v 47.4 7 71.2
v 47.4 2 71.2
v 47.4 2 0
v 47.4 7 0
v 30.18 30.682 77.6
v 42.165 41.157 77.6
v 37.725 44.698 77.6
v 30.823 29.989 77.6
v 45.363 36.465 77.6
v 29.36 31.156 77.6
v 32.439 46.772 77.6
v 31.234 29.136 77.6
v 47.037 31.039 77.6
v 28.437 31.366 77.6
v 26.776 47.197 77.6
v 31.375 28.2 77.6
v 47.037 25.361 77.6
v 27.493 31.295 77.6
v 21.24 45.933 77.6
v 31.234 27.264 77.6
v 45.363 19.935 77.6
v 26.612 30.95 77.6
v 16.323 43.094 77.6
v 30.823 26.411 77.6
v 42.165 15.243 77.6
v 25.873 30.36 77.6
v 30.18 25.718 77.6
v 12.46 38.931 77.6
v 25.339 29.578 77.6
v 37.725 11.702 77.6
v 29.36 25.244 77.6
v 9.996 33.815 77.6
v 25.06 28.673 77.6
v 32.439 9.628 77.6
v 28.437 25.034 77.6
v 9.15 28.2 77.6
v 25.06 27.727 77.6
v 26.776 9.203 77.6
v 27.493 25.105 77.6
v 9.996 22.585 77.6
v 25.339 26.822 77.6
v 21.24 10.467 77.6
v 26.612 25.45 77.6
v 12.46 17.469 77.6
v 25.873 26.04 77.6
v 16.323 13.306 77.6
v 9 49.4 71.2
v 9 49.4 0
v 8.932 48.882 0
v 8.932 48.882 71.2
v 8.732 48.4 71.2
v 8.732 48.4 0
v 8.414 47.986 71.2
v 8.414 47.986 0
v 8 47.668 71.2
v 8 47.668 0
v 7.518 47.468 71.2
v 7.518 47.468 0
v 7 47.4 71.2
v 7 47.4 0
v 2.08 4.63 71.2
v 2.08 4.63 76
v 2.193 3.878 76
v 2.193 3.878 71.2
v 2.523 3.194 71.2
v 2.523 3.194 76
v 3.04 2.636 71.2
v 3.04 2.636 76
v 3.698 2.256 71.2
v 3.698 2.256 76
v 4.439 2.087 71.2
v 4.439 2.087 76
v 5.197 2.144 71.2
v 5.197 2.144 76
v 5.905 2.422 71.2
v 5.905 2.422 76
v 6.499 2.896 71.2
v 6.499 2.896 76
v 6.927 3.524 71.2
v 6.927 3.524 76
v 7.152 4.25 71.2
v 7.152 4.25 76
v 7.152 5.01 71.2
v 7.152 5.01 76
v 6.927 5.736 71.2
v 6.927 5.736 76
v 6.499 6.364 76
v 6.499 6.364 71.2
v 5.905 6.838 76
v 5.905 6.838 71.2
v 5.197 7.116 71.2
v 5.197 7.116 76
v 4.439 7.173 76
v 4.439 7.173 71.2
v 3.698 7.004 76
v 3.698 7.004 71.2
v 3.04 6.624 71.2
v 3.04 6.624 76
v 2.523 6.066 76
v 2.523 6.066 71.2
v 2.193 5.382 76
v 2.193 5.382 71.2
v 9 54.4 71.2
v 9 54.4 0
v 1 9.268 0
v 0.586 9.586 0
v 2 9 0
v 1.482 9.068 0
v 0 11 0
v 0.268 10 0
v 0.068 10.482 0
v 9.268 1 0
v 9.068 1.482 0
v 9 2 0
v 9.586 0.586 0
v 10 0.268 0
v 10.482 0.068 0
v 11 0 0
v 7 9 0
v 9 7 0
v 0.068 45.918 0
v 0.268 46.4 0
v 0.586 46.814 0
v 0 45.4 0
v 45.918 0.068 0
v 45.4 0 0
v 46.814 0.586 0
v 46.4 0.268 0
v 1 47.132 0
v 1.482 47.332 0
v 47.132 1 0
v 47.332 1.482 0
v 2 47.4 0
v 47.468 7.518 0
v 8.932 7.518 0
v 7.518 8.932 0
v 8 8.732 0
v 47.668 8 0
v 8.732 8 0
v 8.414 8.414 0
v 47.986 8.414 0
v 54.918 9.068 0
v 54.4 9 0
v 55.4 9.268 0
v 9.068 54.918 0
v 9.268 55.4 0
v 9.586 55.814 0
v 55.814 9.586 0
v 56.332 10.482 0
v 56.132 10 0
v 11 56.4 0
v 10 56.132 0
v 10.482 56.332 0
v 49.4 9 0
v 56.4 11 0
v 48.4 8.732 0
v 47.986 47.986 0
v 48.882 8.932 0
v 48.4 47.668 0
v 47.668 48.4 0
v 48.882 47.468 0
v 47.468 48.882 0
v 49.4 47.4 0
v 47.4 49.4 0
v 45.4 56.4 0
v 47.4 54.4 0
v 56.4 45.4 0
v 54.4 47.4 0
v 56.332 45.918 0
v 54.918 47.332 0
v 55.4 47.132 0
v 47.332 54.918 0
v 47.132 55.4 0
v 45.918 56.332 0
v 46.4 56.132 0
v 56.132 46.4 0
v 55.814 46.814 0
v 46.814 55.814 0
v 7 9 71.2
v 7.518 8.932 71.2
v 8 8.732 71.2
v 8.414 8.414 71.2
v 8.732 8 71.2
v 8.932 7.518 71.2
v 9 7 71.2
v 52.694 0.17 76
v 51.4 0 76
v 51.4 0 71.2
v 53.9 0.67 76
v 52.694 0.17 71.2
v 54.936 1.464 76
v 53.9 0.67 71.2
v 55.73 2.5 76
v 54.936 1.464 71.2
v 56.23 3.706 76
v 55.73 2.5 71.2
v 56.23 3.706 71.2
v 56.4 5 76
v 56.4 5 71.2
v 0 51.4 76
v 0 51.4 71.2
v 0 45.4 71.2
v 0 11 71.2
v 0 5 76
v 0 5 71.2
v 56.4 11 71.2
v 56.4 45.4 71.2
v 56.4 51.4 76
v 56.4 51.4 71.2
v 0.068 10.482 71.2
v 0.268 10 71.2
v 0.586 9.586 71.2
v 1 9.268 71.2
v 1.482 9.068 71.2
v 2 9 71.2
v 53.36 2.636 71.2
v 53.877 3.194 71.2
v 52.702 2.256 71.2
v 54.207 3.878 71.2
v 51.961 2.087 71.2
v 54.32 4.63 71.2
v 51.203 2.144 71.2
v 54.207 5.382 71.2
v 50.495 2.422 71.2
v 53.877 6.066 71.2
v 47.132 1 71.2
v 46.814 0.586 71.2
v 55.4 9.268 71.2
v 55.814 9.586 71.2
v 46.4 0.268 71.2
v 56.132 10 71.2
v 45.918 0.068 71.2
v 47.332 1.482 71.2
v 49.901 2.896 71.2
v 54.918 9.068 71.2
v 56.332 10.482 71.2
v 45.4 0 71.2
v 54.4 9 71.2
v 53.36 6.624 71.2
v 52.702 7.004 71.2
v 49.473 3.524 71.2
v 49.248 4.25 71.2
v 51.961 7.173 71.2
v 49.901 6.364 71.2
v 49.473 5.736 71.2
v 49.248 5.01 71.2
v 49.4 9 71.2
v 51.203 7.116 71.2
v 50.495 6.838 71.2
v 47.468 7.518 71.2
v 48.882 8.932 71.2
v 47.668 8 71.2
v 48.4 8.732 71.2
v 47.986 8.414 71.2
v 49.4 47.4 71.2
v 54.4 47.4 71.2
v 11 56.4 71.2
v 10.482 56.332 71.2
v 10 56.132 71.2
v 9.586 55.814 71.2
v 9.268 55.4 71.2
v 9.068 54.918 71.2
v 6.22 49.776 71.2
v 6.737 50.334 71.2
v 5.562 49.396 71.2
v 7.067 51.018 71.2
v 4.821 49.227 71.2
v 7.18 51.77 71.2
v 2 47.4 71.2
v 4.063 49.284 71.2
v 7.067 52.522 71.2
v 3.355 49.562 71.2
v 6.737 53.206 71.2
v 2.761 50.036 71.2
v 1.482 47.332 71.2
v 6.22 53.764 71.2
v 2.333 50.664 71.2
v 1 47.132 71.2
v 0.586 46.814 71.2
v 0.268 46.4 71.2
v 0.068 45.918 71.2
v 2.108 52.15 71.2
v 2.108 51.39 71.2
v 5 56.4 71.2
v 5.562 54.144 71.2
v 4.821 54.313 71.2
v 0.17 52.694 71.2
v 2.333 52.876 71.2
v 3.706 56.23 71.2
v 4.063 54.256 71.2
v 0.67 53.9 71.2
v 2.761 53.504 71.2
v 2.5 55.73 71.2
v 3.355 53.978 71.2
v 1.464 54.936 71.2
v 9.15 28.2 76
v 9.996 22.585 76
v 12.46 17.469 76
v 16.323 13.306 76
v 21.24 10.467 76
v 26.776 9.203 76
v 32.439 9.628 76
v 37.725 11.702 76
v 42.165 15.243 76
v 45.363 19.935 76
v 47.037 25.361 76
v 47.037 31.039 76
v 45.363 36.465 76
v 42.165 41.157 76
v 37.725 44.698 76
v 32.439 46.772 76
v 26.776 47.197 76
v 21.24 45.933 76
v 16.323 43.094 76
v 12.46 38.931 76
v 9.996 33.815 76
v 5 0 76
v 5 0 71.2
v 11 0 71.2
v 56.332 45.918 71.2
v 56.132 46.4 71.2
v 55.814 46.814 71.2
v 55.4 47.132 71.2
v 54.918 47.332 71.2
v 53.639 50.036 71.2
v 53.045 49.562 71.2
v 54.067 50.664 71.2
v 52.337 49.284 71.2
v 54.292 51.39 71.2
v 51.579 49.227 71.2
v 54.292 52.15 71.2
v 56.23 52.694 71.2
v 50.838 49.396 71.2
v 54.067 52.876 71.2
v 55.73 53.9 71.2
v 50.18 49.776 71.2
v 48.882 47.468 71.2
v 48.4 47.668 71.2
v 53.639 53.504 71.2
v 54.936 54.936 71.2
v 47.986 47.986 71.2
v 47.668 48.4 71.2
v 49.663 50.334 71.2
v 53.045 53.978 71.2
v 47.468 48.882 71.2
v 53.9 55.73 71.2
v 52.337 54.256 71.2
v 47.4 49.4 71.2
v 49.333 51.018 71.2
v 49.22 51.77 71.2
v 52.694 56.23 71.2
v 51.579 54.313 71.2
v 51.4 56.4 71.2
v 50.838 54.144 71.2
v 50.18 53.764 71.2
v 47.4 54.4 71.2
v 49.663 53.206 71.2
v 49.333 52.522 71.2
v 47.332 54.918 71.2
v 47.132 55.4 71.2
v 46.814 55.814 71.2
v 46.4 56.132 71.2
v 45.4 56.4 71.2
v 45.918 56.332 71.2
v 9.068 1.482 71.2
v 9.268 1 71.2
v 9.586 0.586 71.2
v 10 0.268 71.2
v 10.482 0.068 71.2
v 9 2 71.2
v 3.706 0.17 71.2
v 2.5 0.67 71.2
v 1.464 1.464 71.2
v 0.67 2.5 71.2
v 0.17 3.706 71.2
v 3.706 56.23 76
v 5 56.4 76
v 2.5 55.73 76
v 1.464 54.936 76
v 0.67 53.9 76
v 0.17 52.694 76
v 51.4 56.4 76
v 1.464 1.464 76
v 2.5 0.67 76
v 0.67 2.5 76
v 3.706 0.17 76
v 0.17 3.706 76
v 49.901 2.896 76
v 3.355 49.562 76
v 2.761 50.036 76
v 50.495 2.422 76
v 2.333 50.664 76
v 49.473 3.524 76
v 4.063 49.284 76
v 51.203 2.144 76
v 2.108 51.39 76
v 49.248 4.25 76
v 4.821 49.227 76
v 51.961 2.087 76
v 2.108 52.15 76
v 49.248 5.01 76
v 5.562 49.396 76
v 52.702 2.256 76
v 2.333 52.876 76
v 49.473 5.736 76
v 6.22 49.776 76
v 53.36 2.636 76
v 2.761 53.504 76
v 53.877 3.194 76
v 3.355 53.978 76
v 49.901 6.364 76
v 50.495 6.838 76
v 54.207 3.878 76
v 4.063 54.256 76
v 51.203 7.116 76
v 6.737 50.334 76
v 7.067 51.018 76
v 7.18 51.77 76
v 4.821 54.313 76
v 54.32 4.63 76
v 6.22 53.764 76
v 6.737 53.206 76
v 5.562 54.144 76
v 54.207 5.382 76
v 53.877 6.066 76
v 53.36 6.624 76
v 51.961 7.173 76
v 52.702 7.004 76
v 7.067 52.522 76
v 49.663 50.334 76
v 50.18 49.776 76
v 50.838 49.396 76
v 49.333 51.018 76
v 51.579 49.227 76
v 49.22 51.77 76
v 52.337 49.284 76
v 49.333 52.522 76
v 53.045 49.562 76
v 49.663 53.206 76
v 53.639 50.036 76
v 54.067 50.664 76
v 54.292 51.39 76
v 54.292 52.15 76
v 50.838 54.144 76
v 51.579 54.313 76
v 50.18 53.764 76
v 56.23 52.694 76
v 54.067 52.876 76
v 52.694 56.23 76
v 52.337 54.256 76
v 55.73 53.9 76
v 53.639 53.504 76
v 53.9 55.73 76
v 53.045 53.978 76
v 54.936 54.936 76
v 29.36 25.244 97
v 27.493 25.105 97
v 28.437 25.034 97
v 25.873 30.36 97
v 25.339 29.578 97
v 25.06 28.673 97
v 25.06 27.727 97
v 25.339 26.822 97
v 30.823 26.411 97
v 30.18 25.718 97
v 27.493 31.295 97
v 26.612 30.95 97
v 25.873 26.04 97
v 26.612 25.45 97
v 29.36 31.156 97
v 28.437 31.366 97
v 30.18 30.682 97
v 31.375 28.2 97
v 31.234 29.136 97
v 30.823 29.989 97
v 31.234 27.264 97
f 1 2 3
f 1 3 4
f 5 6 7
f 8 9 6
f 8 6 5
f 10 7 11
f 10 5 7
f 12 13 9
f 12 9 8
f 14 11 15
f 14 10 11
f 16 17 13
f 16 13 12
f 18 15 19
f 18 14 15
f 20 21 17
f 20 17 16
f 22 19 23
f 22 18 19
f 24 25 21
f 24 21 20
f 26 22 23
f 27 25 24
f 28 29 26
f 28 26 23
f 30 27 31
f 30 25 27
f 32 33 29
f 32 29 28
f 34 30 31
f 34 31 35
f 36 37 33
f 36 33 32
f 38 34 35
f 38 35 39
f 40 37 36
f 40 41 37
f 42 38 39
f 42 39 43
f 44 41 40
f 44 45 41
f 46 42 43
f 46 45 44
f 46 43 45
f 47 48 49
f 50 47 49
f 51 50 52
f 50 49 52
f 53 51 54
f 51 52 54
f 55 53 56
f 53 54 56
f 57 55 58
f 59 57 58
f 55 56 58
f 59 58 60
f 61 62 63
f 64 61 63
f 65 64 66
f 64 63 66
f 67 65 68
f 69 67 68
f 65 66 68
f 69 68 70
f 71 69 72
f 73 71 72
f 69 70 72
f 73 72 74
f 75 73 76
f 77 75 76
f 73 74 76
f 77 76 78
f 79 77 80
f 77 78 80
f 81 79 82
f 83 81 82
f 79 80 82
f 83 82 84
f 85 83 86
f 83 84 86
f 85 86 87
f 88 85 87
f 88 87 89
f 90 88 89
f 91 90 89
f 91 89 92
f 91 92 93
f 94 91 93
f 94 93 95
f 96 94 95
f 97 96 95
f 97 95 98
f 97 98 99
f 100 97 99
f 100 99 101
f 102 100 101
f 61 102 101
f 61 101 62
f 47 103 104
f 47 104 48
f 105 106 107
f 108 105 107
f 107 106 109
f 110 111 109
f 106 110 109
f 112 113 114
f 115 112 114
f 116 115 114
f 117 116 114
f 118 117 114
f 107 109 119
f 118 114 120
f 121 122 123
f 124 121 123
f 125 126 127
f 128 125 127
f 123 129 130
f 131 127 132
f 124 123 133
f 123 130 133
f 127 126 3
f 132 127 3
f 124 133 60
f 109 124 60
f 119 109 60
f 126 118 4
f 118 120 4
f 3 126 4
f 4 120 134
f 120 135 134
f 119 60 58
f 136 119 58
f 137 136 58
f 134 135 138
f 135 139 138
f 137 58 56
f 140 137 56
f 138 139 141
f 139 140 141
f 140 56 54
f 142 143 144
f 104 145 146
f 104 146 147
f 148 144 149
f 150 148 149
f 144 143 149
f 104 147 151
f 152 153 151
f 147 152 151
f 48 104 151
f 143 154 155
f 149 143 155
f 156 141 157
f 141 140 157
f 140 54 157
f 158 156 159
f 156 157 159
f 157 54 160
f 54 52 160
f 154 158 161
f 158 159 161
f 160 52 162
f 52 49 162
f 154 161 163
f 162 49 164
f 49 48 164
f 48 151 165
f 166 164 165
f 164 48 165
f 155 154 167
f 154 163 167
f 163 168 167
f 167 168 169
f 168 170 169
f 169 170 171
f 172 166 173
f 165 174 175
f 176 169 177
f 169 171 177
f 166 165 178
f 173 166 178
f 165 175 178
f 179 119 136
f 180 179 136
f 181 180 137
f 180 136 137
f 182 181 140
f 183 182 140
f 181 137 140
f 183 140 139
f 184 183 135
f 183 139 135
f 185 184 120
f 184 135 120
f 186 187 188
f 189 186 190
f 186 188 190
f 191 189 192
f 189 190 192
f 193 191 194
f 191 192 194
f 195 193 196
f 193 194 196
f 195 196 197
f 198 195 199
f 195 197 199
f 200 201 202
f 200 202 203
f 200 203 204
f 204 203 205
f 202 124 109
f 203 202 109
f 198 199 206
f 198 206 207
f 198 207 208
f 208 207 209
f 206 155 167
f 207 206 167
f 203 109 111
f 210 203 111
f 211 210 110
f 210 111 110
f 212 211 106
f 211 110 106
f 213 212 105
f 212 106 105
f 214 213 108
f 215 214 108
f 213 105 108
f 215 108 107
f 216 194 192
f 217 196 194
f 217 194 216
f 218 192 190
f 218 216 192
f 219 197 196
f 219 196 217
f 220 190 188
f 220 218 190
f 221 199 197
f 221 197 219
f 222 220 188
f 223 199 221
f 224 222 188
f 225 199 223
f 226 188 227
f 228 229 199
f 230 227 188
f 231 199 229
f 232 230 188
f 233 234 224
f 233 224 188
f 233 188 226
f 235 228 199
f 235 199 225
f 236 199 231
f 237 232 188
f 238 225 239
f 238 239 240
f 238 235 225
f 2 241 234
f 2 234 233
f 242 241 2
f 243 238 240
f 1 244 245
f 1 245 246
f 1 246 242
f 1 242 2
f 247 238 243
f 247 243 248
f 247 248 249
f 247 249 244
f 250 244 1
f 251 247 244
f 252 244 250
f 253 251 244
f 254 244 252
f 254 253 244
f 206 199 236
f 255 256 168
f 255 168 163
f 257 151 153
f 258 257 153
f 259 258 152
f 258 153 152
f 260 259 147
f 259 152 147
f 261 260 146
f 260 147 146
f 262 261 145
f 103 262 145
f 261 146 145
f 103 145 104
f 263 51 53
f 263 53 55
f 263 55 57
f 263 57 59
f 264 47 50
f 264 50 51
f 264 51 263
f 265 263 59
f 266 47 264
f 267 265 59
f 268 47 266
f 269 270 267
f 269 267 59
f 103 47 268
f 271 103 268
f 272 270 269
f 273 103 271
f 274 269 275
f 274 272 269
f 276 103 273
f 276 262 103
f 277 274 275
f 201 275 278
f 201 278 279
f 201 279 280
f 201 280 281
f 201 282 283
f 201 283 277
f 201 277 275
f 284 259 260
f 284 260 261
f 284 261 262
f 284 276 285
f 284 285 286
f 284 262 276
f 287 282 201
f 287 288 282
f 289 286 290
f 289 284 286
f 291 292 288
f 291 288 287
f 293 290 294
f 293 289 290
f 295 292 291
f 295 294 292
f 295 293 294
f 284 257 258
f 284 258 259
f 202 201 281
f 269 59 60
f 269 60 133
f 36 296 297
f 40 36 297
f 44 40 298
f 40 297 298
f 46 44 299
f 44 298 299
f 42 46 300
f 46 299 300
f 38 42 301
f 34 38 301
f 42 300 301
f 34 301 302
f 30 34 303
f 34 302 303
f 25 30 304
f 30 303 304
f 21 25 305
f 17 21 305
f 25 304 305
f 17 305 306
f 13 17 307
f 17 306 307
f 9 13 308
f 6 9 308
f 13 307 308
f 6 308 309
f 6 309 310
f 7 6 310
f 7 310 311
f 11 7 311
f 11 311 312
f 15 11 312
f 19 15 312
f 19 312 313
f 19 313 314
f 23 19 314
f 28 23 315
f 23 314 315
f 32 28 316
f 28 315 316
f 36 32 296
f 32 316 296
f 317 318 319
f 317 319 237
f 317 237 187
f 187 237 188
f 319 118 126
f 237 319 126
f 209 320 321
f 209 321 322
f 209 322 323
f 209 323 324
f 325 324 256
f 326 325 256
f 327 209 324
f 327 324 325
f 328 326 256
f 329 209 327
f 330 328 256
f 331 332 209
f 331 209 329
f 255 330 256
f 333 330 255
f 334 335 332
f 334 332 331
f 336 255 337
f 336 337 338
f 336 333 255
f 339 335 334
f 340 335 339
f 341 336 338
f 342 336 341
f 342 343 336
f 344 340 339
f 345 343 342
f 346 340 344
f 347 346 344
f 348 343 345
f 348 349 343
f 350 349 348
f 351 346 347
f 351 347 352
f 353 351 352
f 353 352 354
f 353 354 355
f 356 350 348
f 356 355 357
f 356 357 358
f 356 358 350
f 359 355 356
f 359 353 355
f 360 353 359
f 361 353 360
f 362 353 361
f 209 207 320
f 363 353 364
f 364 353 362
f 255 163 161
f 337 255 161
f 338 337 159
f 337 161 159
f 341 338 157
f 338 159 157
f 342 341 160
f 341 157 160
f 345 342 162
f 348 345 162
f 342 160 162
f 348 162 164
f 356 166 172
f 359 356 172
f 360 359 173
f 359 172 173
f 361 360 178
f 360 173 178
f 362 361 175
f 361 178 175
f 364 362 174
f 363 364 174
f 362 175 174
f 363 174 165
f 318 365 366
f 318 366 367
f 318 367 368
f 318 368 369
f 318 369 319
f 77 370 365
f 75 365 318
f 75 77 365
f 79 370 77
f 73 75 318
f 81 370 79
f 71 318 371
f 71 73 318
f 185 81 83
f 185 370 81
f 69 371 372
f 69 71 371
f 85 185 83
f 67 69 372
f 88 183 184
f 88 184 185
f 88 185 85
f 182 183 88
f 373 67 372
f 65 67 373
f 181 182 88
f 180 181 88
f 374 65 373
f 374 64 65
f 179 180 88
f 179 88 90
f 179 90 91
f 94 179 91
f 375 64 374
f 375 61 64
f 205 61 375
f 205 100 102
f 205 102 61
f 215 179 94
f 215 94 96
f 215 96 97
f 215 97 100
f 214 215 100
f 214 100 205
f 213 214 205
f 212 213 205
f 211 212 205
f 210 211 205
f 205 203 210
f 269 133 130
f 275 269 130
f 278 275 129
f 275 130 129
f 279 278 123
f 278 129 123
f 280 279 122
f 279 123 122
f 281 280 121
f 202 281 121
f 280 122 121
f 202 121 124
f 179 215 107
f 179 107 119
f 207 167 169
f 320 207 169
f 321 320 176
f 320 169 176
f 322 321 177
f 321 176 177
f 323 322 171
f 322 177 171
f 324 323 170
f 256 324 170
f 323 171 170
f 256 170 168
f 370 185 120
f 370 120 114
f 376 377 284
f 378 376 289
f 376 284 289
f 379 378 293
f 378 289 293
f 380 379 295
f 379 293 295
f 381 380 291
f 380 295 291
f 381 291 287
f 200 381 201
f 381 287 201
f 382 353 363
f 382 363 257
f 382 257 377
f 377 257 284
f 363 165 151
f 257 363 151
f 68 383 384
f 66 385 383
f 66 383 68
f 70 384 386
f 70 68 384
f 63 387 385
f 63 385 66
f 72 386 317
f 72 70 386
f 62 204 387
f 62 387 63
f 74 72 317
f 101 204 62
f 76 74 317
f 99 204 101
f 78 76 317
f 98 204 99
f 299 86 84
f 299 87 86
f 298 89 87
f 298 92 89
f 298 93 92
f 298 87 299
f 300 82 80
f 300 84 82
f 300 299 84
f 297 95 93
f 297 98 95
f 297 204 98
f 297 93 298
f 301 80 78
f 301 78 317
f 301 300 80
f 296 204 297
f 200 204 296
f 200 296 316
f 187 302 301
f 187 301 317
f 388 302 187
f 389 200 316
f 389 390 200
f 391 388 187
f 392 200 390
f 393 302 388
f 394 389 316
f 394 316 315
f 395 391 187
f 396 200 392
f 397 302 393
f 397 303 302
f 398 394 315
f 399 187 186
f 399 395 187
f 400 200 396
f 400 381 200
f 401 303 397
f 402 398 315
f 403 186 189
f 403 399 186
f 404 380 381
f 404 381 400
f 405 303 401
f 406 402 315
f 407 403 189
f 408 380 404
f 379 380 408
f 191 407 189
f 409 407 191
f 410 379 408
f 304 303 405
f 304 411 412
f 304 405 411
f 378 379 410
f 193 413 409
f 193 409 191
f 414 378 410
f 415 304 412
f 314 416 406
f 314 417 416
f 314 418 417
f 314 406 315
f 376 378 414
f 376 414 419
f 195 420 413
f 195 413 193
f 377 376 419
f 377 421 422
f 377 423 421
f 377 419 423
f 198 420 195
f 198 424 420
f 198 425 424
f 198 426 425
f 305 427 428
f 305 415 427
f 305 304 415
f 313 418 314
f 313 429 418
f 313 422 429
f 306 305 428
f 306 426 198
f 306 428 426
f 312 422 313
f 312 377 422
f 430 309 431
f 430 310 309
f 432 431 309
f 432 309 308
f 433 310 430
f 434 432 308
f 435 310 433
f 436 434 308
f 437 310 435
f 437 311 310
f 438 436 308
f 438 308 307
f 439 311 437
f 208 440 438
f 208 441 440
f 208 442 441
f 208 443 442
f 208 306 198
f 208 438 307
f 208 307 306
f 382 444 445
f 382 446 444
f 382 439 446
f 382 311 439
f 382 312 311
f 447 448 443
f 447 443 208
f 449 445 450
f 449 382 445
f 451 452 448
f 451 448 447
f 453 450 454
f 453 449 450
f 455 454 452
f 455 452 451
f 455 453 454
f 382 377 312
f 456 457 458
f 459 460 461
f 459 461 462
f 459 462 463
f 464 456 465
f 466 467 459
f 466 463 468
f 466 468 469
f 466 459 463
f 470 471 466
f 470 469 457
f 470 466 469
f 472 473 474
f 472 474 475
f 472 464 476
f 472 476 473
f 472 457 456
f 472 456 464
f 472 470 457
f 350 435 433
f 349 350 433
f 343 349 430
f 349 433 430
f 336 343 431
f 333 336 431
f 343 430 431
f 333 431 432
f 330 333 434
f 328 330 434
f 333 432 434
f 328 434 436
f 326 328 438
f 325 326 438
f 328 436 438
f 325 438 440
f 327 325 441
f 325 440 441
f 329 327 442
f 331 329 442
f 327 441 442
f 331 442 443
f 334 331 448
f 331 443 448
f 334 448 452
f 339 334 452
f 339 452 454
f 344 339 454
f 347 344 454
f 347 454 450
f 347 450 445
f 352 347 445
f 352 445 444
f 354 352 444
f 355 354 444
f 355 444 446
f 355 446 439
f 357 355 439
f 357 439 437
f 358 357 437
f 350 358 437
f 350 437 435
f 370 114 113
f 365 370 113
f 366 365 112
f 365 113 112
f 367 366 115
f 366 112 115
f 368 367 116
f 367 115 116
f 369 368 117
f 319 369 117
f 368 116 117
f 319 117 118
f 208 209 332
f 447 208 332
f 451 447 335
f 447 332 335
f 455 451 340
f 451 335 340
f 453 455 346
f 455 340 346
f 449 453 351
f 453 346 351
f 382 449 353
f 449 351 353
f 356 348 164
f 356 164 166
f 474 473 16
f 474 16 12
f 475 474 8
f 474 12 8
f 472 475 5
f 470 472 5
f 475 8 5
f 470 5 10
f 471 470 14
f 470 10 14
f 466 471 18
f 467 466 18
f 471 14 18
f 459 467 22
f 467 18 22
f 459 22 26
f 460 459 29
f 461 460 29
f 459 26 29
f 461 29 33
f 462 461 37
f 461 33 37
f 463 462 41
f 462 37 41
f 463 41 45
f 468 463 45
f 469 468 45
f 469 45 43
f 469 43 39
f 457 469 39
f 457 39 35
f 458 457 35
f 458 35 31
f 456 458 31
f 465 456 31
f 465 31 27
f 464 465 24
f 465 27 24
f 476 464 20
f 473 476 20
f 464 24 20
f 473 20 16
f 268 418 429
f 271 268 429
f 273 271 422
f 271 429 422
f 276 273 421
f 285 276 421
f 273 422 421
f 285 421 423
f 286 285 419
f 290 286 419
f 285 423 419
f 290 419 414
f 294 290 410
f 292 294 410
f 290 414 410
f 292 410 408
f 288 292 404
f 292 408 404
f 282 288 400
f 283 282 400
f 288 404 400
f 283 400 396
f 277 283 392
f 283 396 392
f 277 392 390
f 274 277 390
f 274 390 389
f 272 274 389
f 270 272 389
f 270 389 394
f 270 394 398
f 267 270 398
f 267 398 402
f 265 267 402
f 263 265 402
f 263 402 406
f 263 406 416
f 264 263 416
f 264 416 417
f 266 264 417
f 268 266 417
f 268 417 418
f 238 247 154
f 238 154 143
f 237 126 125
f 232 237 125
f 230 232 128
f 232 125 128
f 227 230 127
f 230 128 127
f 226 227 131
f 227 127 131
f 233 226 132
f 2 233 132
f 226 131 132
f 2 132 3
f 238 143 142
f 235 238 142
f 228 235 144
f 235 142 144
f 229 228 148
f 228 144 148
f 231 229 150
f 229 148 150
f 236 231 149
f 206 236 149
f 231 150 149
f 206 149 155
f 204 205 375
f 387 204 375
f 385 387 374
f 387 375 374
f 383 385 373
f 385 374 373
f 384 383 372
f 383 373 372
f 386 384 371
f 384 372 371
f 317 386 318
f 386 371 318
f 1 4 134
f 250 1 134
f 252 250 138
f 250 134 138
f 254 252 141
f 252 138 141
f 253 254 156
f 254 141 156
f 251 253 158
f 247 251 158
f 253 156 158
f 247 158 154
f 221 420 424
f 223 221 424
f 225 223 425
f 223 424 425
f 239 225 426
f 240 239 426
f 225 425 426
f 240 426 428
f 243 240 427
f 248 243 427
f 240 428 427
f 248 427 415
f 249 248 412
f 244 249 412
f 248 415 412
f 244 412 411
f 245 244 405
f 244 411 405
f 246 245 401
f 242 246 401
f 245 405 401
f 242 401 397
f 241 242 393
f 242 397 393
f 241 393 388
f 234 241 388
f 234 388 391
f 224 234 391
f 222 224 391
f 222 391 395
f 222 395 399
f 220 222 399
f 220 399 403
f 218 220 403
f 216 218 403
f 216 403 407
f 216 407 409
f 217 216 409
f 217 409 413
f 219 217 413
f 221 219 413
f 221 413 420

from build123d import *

# Parameters (mm, degrees)
EXTRUDE_1_DEPTH     = 76
SKETCH_2_R          = 19.05
EXTRUDE_2_DEPTH     = 1.6
SKETCH_3_OUTSIDE_W  = 80.656
SKETCH_3_OUTSIDE_H  = 80.656
CUT_EXTRUDE_1_DEPTH = 71.2
SKETCH_4_R          = 2.55
CUT_EXTRUDE_2_DEPTH = 71.2
SKETCH_5_R          = 3.175
EXTRUDE_3_DEPTH     = 19.4


with BuildPart() as part:
    # Эскиз1 → Бобышка-Вытянуть1 (new body)
    with BuildSketch(Plane.XY):
        with BuildLine():
            Line((5, 0), (51.4, 0))
            ThreePointArc((51.4, 0), (54.935533906, 1.464466094), (56.4, 5))
            Line((56.4, 5), (56.4, 51.4))
            ThreePointArc((56.4, 51.4), (54.935533906, 54.935533906), (51.4, 56.4))
            Line((51.4, 56.4), (5, 56.4))
            ThreePointArc((5, 56.4), (1.464466094, 54.935533906), (0, 51.4))
            Line((0, 51.4), (0, 5))
            ThreePointArc((0, 5), (1.464466094, 1.464466094), (5, 0))
        make_face()
    extrude(amount=EXTRUDE_1_DEPTH)

    # Эскиз2 → Бобышка-Вытянуть2 (add)
    with BuildSketch(Plane.XY.offset(76)):
        with Locations(Location((28.2, 28.2, 0), (0, 0, 180))):
            Circle(SKETCH_2_R)
    extrude(amount=EXTRUDE_2_DEPTH)

    # Эскиз3 outside → Вырез-Вытянуть1 (cut)
    with BuildSketch(Plane(origin=(0, 0, 0), x_dir=(-1, 0, 0), z_dir=(0, 0, -1))):
        with Locations((-28.2, 28.2)):
            Rectangle(SKETCH_3_OUTSIDE_W, SKETCH_3_OUTSIDE_H)
        with BuildLine():
            Line((-56.4, 11), (-56.4, 45.4))
            ThreePointArc((-56.4, 45.4), (-55.814213562, 46.814213562), (-54.4, 47.4))
            Line((-54.4, 47.4), (-49.4, 47.4))
            ThreePointArc((-49.4, 47.4), (-47.985786438, 47.985786438), (-47.4, 49.4))
            Line((-47.4, 49.4), (-47.4, 54.4))
            ThreePointArc((-47.4, 54.4), (-46.814213562, 55.814213562), (-45.4, 56.4))
            Line((-45.4, 56.4), (-11, 56.4))
            ThreePointArc((-11, 56.4), (-9.585786438, 55.814213562), (-9, 54.4))
            Line((-9, 54.4), (-9, 49.4))
            ThreePointArc((-9, 49.4), (-8.414213562, 47.985786438), (-7, 47.4))
            Line((-7, 47.4), (-2, 47.4))
            ThreePointArc((-2, 47.4), (-0.585786438, 46.814213562), (0, 45.4))
            Line((0, 45.4), (0, 11))
            ThreePointArc((0, 11), (-0.585786438, 9.585786438), (-2, 9))
            Line((-2, 9), (-7, 9))
            ThreePointArc((-7, 9), (-8.414213562, 8.414213562), (-9, 7))
            Line((-9, 7), (-9, 2))
            ThreePointArc((-9, 2), (-9.585786438, 0.585786438), (-11, 0))
            Line((-11, 0), (-45.4, 0))
            ThreePointArc((-45.4, 0), (-46.814213562, 0.585786438), (-47.4, 2))
            Line((-47.4, 2), (-47.4, 7))
            ThreePointArc((-47.4, 7), (-47.985786438, 8.414213562), (-49.4, 9))
            Line((-49.4, 9), (-54.4, 9))
            ThreePointArc((-54.4, 9), (-55.814213562, 9.585786438), (-56.4, 11))
        make_face(mode=Mode.SUBTRACT)
    extrude(amount=-CUT_EXTRUDE_1_DEPTH, mode=Mode.SUBTRACT)

    # Эскиз4 → Вырез-Вытянуть2 (cut)
    with BuildSketch(Plane.XY.offset(76)):
        with Locations((4.63, 51.77)):
            Circle(SKETCH_4_R)
        with Locations(Location((51.77, 51.77, 0), (0, 0, 180))):
            Circle(SKETCH_4_R)
        with Locations(Location((4.63, 4.63, 0), (0, 0, 180))):
            Circle(SKETCH_4_R)
        with Locations((51.77, 4.63)):
            Circle(SKETCH_4_R)
    extrude(amount=-CUT_EXTRUDE_2_DEPTH, mode=Mode.SUBTRACT)

    # Эскиз5 → Бобышка-Вытянуть3 (add)
    with BuildSketch(Plane.XY.offset(77.6)):
        with Locations((28.2, 28.2)):
            Circle(SKETCH_5_R)
    extrude(amount=EXTRUDE_3_DEPTH)


solid = part.part
